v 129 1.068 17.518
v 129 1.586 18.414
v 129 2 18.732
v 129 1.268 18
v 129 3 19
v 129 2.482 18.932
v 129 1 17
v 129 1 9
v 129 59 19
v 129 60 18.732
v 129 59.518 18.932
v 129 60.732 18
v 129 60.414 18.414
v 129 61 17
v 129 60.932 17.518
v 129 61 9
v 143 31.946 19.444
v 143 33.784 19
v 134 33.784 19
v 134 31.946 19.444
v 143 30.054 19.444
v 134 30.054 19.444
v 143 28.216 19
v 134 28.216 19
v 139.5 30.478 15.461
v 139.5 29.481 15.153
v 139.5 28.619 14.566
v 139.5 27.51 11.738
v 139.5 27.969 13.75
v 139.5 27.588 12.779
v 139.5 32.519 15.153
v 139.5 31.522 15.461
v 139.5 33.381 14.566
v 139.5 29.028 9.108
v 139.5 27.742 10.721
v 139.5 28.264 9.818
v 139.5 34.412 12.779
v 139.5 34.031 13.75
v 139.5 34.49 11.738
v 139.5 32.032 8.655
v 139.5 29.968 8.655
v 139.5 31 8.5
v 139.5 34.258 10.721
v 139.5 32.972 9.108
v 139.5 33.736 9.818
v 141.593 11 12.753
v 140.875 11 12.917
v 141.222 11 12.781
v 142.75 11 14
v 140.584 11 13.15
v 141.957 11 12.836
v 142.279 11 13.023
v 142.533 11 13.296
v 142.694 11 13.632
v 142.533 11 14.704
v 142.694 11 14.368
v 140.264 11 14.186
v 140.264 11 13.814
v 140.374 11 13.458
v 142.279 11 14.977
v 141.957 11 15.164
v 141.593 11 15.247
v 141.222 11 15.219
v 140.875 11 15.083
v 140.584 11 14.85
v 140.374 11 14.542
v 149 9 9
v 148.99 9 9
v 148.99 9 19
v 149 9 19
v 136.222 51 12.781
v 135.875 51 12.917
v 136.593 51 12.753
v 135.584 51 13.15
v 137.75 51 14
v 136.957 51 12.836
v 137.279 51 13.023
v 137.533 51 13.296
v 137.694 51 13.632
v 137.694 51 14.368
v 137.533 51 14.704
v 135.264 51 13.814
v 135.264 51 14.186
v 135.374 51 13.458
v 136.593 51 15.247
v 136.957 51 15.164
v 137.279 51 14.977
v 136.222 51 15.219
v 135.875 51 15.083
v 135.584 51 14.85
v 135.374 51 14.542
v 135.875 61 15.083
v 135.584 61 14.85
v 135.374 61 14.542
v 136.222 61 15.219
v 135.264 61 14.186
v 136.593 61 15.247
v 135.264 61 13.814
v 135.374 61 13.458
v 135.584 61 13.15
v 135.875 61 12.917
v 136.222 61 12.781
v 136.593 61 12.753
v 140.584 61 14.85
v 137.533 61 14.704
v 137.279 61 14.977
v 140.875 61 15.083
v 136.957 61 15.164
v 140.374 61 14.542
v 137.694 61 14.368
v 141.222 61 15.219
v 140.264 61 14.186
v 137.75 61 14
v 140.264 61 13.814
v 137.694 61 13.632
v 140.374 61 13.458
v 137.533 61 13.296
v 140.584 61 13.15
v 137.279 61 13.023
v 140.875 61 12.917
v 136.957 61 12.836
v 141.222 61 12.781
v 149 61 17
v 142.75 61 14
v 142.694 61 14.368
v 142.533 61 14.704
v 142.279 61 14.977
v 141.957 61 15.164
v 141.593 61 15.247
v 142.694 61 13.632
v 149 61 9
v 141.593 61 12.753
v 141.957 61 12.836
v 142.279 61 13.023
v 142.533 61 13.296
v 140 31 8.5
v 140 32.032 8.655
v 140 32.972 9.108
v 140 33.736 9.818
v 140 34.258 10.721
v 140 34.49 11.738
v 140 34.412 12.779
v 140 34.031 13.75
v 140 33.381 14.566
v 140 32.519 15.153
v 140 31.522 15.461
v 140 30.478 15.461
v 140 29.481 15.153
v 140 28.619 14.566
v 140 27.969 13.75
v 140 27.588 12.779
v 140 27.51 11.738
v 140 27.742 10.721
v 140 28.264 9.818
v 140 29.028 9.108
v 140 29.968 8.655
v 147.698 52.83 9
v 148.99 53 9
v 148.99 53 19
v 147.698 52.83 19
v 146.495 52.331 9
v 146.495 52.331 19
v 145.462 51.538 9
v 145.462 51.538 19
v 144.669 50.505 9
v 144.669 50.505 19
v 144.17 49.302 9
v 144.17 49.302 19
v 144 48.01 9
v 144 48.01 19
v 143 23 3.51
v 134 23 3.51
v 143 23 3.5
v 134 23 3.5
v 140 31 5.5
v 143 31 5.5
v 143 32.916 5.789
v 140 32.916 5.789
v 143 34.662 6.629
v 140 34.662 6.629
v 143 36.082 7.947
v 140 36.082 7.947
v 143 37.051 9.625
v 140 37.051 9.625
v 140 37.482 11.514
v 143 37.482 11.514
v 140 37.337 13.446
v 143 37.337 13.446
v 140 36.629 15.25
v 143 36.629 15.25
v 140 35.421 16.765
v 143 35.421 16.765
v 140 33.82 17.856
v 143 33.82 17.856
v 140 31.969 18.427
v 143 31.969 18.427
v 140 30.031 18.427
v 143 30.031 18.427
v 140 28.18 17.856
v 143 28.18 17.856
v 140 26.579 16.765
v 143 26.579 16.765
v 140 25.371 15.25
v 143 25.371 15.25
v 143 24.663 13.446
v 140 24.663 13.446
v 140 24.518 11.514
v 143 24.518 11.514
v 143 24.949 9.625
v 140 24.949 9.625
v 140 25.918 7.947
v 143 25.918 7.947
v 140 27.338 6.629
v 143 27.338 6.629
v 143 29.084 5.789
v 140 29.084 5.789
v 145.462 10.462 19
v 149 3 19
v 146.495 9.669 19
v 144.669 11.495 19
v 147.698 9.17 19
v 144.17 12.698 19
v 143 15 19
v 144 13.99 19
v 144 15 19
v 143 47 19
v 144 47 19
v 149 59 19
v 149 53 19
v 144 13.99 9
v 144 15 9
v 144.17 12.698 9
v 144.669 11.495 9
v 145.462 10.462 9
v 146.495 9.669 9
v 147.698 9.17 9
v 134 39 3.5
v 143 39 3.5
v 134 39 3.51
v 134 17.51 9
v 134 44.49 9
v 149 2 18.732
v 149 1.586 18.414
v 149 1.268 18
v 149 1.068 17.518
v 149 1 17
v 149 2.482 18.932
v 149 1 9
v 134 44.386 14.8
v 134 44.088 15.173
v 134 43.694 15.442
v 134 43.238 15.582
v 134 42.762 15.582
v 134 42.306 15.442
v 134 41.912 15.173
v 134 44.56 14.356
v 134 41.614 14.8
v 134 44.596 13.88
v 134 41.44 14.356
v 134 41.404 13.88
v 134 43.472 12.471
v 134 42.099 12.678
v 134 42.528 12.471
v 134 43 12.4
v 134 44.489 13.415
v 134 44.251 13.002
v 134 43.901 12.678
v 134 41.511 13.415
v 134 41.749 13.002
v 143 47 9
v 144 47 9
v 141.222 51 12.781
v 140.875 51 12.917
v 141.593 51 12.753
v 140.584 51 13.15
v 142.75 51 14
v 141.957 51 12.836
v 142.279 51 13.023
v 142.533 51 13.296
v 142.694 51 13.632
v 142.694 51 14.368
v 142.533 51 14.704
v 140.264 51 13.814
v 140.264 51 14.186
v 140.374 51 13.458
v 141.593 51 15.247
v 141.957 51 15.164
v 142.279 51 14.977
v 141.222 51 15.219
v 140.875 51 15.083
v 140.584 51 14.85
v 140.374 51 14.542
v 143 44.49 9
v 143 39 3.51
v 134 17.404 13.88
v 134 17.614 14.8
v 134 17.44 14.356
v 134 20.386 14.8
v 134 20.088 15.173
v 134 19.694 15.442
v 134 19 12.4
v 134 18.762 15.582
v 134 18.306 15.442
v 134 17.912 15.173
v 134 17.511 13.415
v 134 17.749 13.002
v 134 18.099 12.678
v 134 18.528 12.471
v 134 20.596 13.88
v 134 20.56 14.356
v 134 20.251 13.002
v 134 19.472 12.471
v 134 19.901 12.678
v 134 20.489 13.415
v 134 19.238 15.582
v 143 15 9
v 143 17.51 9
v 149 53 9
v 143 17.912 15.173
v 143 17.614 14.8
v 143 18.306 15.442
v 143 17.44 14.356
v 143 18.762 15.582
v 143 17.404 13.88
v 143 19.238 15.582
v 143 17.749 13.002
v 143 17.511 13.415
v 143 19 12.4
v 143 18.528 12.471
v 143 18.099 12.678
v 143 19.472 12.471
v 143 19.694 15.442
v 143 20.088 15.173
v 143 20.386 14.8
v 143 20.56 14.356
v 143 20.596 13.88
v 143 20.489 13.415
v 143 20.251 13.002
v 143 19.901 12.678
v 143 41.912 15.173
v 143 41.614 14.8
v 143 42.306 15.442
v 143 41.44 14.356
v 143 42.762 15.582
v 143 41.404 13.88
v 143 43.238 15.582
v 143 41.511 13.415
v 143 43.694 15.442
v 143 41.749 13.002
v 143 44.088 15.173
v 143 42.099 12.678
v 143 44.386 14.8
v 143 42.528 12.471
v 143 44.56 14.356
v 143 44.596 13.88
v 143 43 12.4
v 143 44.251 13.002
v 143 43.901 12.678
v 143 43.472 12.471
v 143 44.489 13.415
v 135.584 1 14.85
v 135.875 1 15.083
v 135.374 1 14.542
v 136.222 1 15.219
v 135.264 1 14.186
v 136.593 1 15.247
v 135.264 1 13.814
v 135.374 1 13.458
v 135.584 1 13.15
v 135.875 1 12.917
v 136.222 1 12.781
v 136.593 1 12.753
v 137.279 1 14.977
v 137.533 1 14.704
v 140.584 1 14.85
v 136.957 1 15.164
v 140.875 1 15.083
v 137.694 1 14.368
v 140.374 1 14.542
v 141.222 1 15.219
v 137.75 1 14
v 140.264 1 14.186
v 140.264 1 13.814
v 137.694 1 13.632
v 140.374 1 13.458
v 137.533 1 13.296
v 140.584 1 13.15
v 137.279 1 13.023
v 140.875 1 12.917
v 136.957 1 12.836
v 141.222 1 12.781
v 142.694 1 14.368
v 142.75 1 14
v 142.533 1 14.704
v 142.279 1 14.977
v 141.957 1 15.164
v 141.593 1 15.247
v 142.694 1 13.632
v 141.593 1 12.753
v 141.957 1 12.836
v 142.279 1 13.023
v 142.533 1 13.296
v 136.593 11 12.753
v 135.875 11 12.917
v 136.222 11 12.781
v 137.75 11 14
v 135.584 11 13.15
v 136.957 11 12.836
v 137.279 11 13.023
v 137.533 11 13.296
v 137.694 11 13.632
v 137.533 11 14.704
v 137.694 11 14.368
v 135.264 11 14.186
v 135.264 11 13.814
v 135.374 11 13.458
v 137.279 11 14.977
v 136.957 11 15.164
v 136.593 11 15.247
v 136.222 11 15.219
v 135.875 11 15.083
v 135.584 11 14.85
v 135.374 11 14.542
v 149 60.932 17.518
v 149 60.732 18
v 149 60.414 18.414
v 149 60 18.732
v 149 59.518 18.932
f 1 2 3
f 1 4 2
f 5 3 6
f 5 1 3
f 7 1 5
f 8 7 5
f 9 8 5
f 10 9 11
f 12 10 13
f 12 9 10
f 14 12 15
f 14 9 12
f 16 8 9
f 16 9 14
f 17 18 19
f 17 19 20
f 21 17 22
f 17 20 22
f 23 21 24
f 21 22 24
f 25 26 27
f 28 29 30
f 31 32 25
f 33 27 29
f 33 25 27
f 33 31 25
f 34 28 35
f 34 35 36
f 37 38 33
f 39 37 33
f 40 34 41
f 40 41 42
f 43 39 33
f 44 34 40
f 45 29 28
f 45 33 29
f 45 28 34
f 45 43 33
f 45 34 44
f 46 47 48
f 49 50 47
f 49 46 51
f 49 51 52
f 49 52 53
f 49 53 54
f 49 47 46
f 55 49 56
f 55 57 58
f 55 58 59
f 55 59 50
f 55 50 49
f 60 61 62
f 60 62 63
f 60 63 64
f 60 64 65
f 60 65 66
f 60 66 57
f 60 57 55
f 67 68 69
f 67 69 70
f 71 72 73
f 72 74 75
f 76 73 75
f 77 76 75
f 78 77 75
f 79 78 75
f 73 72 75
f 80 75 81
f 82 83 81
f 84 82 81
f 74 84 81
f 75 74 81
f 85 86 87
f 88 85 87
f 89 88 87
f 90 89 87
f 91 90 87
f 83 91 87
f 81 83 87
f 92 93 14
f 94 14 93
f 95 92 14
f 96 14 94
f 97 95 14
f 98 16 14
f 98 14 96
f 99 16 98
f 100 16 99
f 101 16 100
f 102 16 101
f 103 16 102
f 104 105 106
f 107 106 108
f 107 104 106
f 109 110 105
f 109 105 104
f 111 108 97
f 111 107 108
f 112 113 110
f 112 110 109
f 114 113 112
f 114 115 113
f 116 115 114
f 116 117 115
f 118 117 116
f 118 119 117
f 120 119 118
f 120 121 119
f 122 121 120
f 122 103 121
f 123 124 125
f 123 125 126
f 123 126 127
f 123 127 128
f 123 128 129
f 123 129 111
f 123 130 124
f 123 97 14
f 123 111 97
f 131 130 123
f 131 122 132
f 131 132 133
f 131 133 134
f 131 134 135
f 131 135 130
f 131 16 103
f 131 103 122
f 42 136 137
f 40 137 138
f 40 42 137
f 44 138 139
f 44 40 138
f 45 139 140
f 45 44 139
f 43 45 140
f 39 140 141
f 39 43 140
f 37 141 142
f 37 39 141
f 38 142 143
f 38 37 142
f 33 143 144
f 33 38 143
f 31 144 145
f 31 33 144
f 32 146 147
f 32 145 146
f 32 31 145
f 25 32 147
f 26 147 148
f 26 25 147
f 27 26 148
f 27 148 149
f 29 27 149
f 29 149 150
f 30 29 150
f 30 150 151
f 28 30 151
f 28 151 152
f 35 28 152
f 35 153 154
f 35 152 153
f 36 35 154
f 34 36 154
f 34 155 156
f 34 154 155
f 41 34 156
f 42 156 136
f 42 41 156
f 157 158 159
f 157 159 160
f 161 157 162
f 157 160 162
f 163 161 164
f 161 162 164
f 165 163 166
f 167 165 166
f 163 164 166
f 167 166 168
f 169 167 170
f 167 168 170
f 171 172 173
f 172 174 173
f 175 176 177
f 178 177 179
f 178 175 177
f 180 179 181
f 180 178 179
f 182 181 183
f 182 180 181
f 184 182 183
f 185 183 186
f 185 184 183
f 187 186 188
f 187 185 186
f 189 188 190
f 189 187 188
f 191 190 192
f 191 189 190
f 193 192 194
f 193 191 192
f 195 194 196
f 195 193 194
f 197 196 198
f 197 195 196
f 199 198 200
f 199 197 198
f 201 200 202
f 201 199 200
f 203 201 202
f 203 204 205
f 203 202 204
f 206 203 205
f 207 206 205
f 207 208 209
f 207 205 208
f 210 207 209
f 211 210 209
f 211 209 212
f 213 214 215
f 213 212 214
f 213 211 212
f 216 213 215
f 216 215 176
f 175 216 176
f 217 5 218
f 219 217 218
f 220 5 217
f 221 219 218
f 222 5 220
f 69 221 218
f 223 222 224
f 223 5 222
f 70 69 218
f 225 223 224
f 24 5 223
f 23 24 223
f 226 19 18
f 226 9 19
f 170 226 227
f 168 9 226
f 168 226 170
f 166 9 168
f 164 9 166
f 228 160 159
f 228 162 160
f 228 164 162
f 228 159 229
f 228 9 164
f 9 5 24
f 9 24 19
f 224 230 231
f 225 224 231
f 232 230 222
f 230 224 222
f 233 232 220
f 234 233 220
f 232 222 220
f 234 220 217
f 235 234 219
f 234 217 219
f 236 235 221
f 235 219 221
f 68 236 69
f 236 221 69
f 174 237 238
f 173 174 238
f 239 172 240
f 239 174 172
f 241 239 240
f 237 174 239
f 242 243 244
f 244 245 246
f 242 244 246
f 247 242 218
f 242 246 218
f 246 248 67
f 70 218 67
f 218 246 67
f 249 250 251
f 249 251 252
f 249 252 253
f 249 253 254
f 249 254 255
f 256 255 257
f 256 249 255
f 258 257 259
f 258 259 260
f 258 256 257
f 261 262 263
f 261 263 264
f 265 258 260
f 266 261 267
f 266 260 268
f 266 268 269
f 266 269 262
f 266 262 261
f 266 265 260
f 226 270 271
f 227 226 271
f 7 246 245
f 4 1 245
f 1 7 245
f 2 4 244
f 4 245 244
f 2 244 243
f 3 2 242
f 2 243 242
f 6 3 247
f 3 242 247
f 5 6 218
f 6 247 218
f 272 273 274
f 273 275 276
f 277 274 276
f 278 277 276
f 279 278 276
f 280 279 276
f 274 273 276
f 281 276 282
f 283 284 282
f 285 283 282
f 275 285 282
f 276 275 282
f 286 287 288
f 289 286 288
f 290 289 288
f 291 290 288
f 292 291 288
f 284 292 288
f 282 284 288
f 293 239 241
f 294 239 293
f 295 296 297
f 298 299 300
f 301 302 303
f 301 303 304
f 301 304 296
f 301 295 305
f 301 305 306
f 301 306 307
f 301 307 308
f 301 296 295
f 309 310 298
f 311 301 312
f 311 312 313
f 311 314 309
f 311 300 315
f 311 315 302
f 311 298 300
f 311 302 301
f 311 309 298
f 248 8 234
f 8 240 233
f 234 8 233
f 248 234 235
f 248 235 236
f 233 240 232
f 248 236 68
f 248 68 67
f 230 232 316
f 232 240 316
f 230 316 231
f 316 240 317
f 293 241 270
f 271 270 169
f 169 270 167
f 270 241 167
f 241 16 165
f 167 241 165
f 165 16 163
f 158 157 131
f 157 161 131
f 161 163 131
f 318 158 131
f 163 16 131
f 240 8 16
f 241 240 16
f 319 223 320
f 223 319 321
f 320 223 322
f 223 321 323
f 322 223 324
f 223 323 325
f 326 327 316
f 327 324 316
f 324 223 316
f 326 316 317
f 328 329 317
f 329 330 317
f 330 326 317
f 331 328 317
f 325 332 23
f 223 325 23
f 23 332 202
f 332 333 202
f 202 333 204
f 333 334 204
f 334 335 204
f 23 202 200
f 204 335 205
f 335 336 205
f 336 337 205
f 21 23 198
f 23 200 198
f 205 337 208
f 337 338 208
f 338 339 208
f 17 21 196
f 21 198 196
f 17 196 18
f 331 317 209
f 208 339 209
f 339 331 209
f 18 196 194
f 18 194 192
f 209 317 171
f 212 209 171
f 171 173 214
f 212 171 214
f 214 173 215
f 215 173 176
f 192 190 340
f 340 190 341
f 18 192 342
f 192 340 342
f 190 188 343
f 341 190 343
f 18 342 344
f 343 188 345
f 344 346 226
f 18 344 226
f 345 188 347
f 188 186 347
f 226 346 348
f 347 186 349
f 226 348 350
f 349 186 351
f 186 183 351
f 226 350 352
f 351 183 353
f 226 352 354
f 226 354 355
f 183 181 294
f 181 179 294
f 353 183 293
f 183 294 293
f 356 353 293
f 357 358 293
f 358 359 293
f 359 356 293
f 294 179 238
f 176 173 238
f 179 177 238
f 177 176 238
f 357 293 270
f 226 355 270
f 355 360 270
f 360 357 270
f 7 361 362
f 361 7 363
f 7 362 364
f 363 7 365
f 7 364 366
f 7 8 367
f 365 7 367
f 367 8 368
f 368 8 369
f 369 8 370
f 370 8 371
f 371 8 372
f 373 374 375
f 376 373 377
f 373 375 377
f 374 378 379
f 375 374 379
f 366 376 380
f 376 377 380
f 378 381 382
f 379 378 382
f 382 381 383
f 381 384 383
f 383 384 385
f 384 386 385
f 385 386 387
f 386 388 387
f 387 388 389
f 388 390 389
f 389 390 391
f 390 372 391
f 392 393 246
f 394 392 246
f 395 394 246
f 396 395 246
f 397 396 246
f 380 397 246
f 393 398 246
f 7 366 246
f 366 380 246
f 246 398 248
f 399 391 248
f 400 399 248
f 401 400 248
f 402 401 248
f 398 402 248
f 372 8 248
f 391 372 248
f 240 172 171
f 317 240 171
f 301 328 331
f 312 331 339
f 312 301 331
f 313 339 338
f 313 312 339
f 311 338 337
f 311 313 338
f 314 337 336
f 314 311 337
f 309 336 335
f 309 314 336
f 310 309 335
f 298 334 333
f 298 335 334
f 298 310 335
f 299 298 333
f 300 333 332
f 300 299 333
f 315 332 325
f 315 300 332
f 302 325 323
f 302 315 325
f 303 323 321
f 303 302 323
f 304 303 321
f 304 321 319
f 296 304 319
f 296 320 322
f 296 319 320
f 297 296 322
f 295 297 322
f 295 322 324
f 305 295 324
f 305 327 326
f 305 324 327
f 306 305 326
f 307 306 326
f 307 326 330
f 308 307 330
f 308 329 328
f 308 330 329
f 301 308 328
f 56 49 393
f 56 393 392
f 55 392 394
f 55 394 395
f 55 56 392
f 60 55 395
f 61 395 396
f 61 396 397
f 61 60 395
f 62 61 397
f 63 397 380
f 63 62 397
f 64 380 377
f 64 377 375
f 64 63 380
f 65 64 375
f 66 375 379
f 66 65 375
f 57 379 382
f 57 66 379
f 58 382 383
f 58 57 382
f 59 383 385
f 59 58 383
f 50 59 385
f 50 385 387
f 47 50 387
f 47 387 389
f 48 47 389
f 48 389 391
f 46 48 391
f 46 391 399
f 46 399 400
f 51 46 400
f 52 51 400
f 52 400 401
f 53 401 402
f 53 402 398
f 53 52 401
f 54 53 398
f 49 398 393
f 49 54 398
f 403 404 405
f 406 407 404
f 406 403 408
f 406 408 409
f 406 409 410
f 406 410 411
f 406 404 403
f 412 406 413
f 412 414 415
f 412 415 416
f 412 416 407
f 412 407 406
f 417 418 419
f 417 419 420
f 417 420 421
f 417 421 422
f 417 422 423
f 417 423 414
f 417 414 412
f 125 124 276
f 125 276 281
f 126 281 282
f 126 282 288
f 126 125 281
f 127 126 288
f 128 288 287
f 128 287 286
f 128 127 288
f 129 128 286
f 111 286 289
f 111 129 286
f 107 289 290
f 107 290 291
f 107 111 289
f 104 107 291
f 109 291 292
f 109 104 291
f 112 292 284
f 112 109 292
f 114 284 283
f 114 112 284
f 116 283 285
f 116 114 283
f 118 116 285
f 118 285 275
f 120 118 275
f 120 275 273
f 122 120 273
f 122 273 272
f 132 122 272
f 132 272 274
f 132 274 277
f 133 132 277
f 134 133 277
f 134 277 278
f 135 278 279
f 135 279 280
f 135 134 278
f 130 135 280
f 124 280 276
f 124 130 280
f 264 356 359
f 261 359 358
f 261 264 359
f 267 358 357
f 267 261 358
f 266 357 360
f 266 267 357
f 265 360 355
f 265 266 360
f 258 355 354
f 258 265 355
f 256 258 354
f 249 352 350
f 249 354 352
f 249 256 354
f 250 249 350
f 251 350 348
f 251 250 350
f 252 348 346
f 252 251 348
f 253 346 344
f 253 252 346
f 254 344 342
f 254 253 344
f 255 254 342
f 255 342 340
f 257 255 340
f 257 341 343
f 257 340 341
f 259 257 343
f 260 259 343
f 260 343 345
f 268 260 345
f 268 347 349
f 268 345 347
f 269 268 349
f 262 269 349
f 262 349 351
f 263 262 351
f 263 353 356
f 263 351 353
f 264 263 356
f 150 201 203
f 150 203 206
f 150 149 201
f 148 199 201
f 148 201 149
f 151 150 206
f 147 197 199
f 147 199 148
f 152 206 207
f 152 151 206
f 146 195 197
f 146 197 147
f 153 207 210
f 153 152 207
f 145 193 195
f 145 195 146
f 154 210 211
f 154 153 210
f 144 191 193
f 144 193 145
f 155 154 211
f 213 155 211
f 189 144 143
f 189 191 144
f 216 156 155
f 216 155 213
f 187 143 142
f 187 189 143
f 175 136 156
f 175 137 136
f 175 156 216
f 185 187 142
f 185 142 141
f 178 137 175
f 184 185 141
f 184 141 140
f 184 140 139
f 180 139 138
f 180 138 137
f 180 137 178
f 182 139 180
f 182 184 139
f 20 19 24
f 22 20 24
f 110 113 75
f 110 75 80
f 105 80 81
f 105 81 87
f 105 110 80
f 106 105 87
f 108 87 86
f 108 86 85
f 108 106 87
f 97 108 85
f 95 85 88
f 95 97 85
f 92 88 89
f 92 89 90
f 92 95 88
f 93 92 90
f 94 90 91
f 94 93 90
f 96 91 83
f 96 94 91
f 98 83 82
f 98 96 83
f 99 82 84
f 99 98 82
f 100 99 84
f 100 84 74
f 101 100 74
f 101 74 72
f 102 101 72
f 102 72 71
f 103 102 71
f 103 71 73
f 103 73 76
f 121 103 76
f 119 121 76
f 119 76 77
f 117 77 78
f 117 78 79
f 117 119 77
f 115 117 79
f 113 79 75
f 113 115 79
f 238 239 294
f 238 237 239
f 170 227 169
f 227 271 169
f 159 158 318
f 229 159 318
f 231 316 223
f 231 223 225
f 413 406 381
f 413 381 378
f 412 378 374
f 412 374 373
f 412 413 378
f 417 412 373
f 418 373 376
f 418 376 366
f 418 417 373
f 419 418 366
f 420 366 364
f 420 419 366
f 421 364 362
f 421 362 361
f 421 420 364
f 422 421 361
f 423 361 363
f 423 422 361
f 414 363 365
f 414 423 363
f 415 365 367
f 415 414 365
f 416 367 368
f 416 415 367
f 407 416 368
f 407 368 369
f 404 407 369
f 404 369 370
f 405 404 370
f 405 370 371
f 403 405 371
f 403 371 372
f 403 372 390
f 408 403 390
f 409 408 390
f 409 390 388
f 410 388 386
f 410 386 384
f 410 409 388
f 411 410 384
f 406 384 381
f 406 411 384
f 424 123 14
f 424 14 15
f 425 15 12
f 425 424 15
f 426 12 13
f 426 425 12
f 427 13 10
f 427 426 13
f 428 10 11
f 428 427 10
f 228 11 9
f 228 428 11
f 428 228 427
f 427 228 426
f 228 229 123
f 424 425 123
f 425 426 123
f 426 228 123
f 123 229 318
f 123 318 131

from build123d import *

# Parameters (mm, degrees)
BOX035_W          = 5
BOX035_H          = 60
BOX035_DEPTH      = 10
BOX033_W          = 5
BOX033_H          = 8
BOX033_DEPTH      = 10
FILLET011_R       = 2
BOX034_W          = 5
BOX034_H          = 8
BOX034_DEPTH      = 10
FILLET012_R       = 2
BOX030_W          = 1
BOX030_H          = 32
BOX030_DEPTH      = 22
CYLINDER072_R     = 1.6
CYLINDER072_DEPTH = 10
CYLINDER071_R     = 1.6
CYLINDER071_DEPTH = 10
CYLINDER062_R     = 1.25
CYLINDER062_DEPTH = 10
CYLINDER060_R     = 1.25
CYLINDER060_DEPTH = 10
CYLINDER061_R     = 1.25
CYLINDER061_DEPTH = 10
CYLINDER059_R     = 1.25
CYLINDER059_DEPTH = 10
CYLINDER047_R     = 3.5
CYLINDER047_DEPTH = 4
CYLINDER045_R     = 6.5
CYLINDER045_DEPTH = 4
BOX031_W          = 15
BOX031_H          = 16
BOX031_DEPTH      = 5.5
CYLINDER046_R     = 8
CYLINDER046_DEPTH = 10
BOX021_W          = 10
BOX021_H          = 60
BOX021_DEPTH      = 10
BOX032_W          = 5
BOX032_H          = 60
BOX032_DEPTH      = 10
FILLET010_R       = 2
CHAMFER002_SIZE   = 5.49
FILLET013_R       = 4.99


with BuildPart() as cube014:
    # Box035 → Box035 (new body)
    with BuildSketch(Plane(origin=(75, 1, -1), x_dir=(1, 0, 0), z_dir=(0, 0, 1))):
        with Locations((2.5, 30)):
            Rectangle(BOX035_W, BOX035_H)
    extrude(amount=BOX035_DEPTH)


with BuildPart() as fillet011:
    # Box033 → Box033 (new body)
    with BuildSketch(Plane(origin=(90, 1, 9), x_dir=(1, 0, 0), z_dir=(0, 0, 1))):
        with Locations((2.5, 4)):
            Rectangle(BOX033_W, BOX033_H)
    extrude(amount=BOX033_DEPTH)

    # Fillet011
    fillet011_edges = [fillet011.edges().sort_by_distance(p)[0] for p in [
        (92.5, 1, 19),
    ]]
    fillet(fillet011_edges, radius=FILLET011_R)


with BuildPart() as fillet012:
    # Box034 → Box034 (new body)
    with BuildSketch(Plane(origin=(90, 53, 9), x_dir=(1, 0, 0), z_dir=(0, 0, 1))):
        with Locations((2.5, 4)):
            Rectangle(BOX034_W, BOX034_H)
    extrude(amount=BOX034_DEPTH)

    # Fillet012
    fillet012_edges = [fillet012.edges().sort_by_distance(p)[0] for p in [
        (92.5, 61, 19),
    ]]
    fillet(fillet012_edges, radius=FILLET012_R)


with BuildPart() as cube009:
    # Box030 → Box030 (new body)
    with BuildSketch(Plane(origin=(89, 15, 2), x_dir=(1, 0, 0), z_dir=(0, 0, 1))):
        with Locations((0.5, 16)):
            Rectangle(BOX030_W, BOX030_H)
    extrude(amount=BOX030_DEPTH)


with BuildPart() as cylinder072:
    # Cylinder072 → Cylinder072 (new body)
    with BuildSketch(Plane(origin=(80, 43, 14), x_dir=(0, 0, -1), z_dir=(1, 0, 0))):
        Circle(CYLINDER072_R)
    extrude(amount=CYLINDER072_DEPTH)


with BuildPart() as fusion068:
    # Cylinder071 → Cylinder071 (new body)
    with BuildSketch(Plane(origin=(80, 19, 14), x_dir=(0, 0, -1), z_dir=(1, 0, 0))):
        Circle(CYLINDER071_R)
    extrude(amount=CYLINDER071_DEPTH)

    # Fusion068: union Cylinder072
    add(cylinder072.part)


with BuildPart() as cylinder062:
    # Cylinder062 → Cylinder062 (new body)
    with BuildSketch(Plane(origin=(87.5, 61, 14), x_dir=(1, 0, 0), z_dir=(0, -1, 0))):
        Circle(CYLINDER062_R)
    extrude(amount=CYLINDER062_DEPTH)


with BuildPart() as fusion046:
    # Cylinder060 → Cylinder060 (new body)
    with BuildSketch(Plane(origin=(87.5, 11, 14), x_dir=(1, 0, 0), z_dir=(0, -1, 0))):
        Circle(CYLINDER060_R)
    extrude(amount=CYLINDER060_DEPTH)

    # Fusion046: union Cylinder062
    add(cylinder062.part)


with BuildPart() as cylinder061:
    # Cylinder061 → Cylinder061 (new body)
    with BuildSketch(Plane(origin=(82.5, 61, 14), x_dir=(1, 0, 0), z_dir=(0, -1, 0))):
        Circle(CYLINDER061_R)
    extrude(amount=CYLINDER061_DEPTH)


with BuildPart() as fusion048:
    # Cylinder059 → Cylinder059 (new body)
    with BuildSketch(Plane(origin=(82.5, 11, 14), x_dir=(1, 0, 0), z_dir=(0, -1, 0))):
        Circle(CYLINDER059_R)
    extrude(amount=CYLINDER059_DEPTH)

    # Fusion045: union Cylinder061
    add(cylinder061.part)

    # Fusion048: union Fusion046
    add(fusion046.part)


with BuildPart() as cylinder047:
    # Cylinder047 → Cylinder047 (new body)
    with BuildSketch(Plane(origin=(89.5, 31, 10), x_dir=(0, 0, -1), z_dir=(1, 0, 0))):
        Circle(CYLINDER047_R)
    extrude(amount=CYLINDER047_DEPTH)


with BuildPart() as fusion037:
    # Cylinder045 → Cylinder045 (new body)
    with BuildSketch(Plane(origin=(90, 31, 10), x_dir=(0, 0, -1), z_dir=(1, 0, 0))):
        Circle(CYLINDER045_R)
    extrude(amount=CYLINDER045_DEPTH)

    # Fusion037: union Cylinder047
    add(cylinder047.part)


with BuildPart() as fusion037_1:
    # Fusion037 placement: moved
    add(fusion037.part.moved(Location((-4, 0, 2))))


with BuildPart() as cube010:
    # Box031 → Box031 (new body)
    with BuildSketch(Plane(origin=(75, 23, 3.5), x_dir=(1, 0, 0), z_dir=(0, 0, 1))):
        with Locations((7.5, 8)):
            Rectangle(BOX031_W, BOX031_H)
    extrude(amount=BOX031_DEPTH)


with BuildPart() as cylinder046:
    # Cylinder046 → Cylinder046 (new body)
    with BuildSketch(Plane(origin=(80, 31, 11.5), x_dir=(0, 0, -1), z_dir=(1, 0, 0))):
        Circle(CYLINDER046_R)
    extrude(amount=CYLINDER046_DEPTH)


with BuildPart() as fusion038:
    # Box021 → Box021 (new body)
    with BuildSketch(Plane(origin=(80, 1, 9), x_dir=(1, 0, 0), z_dir=(0, 0, 1))):
        with Locations((5, 30)):
            Rectangle(BOX021_W, BOX021_H)
    extrude(amount=BOX021_DEPTH)

    # Fusion038: union Cylinder046
    add(cylinder046.part)


with BuildPart() as front_threaded_bar_support:
    # Box032 → Box032 (new body)
    with BuildSketch(Plane(origin=(75, 1, 9), x_dir=(1, 0, 0), z_dir=(0, 0, 1))):
        with Locations((2.5, 30)):
            Rectangle(BOX032_W, BOX032_H)
    extrude(amount=BOX032_DEPTH)

    # Fusion069: union Cube010, Fusion038
    add(cube010.part)
    add(fusion038.part)

    # Cut037: cut Fusion037
    add(fusion037_1.part, mode=Mode.SUBTRACT)

    # Cut038: cut Fusion048
    add(fusion048.part, mode=Mode.SUBTRACT)

    # Cut039: cut Fusion068
    add(fusion068.part, mode=Mode.SUBTRACT)

    # Cut040: cut Cube009
    add(cube009.part, mode=Mode.SUBTRACT)

    # Fillet010
    fillet010_edges = [front_threaded_bar_support.edges().sort_by_distance(p)[0] for p in [
        (82.5, 1, 19),
        (82.5, 61, 19),
    ]]
    fillet(fillet010_edges, radius=FILLET010_R)

    # Chamfer002
    chamfer002_edges = [front_threaded_bar_support.edges().sort_by_distance(p)[0] for p in [
        (82, 23, 9),
        (82, 39, 9),
    ]]
    chamfer(chamfer002_edges, length=CHAMFER002_SIZE)

    # Fusion070: union Fillet011, Fillet012
    add(fillet011.part)
    add(fillet012.part)

    # Fillet013
    fillet013_edges = [front_threaded_bar_support.edges().sort_by_distance(p)[0] for p in [
        (90, 53, 14),
        (90, 9, 14),
    ]]
    fillet(fillet013_edges, radius=FILLET013_R)

    # Cut041: cut Cube014
    add(cube014.part, mode=Mode.SUBTRACT)


with BuildPart() as front_threaded_bar_support_1:
    # Cut041 placement: moved
    add(front_threaded_bar_support.part.moved(Location((54, 0, 0))))


solid = front_threaded_bar_support_1.part
